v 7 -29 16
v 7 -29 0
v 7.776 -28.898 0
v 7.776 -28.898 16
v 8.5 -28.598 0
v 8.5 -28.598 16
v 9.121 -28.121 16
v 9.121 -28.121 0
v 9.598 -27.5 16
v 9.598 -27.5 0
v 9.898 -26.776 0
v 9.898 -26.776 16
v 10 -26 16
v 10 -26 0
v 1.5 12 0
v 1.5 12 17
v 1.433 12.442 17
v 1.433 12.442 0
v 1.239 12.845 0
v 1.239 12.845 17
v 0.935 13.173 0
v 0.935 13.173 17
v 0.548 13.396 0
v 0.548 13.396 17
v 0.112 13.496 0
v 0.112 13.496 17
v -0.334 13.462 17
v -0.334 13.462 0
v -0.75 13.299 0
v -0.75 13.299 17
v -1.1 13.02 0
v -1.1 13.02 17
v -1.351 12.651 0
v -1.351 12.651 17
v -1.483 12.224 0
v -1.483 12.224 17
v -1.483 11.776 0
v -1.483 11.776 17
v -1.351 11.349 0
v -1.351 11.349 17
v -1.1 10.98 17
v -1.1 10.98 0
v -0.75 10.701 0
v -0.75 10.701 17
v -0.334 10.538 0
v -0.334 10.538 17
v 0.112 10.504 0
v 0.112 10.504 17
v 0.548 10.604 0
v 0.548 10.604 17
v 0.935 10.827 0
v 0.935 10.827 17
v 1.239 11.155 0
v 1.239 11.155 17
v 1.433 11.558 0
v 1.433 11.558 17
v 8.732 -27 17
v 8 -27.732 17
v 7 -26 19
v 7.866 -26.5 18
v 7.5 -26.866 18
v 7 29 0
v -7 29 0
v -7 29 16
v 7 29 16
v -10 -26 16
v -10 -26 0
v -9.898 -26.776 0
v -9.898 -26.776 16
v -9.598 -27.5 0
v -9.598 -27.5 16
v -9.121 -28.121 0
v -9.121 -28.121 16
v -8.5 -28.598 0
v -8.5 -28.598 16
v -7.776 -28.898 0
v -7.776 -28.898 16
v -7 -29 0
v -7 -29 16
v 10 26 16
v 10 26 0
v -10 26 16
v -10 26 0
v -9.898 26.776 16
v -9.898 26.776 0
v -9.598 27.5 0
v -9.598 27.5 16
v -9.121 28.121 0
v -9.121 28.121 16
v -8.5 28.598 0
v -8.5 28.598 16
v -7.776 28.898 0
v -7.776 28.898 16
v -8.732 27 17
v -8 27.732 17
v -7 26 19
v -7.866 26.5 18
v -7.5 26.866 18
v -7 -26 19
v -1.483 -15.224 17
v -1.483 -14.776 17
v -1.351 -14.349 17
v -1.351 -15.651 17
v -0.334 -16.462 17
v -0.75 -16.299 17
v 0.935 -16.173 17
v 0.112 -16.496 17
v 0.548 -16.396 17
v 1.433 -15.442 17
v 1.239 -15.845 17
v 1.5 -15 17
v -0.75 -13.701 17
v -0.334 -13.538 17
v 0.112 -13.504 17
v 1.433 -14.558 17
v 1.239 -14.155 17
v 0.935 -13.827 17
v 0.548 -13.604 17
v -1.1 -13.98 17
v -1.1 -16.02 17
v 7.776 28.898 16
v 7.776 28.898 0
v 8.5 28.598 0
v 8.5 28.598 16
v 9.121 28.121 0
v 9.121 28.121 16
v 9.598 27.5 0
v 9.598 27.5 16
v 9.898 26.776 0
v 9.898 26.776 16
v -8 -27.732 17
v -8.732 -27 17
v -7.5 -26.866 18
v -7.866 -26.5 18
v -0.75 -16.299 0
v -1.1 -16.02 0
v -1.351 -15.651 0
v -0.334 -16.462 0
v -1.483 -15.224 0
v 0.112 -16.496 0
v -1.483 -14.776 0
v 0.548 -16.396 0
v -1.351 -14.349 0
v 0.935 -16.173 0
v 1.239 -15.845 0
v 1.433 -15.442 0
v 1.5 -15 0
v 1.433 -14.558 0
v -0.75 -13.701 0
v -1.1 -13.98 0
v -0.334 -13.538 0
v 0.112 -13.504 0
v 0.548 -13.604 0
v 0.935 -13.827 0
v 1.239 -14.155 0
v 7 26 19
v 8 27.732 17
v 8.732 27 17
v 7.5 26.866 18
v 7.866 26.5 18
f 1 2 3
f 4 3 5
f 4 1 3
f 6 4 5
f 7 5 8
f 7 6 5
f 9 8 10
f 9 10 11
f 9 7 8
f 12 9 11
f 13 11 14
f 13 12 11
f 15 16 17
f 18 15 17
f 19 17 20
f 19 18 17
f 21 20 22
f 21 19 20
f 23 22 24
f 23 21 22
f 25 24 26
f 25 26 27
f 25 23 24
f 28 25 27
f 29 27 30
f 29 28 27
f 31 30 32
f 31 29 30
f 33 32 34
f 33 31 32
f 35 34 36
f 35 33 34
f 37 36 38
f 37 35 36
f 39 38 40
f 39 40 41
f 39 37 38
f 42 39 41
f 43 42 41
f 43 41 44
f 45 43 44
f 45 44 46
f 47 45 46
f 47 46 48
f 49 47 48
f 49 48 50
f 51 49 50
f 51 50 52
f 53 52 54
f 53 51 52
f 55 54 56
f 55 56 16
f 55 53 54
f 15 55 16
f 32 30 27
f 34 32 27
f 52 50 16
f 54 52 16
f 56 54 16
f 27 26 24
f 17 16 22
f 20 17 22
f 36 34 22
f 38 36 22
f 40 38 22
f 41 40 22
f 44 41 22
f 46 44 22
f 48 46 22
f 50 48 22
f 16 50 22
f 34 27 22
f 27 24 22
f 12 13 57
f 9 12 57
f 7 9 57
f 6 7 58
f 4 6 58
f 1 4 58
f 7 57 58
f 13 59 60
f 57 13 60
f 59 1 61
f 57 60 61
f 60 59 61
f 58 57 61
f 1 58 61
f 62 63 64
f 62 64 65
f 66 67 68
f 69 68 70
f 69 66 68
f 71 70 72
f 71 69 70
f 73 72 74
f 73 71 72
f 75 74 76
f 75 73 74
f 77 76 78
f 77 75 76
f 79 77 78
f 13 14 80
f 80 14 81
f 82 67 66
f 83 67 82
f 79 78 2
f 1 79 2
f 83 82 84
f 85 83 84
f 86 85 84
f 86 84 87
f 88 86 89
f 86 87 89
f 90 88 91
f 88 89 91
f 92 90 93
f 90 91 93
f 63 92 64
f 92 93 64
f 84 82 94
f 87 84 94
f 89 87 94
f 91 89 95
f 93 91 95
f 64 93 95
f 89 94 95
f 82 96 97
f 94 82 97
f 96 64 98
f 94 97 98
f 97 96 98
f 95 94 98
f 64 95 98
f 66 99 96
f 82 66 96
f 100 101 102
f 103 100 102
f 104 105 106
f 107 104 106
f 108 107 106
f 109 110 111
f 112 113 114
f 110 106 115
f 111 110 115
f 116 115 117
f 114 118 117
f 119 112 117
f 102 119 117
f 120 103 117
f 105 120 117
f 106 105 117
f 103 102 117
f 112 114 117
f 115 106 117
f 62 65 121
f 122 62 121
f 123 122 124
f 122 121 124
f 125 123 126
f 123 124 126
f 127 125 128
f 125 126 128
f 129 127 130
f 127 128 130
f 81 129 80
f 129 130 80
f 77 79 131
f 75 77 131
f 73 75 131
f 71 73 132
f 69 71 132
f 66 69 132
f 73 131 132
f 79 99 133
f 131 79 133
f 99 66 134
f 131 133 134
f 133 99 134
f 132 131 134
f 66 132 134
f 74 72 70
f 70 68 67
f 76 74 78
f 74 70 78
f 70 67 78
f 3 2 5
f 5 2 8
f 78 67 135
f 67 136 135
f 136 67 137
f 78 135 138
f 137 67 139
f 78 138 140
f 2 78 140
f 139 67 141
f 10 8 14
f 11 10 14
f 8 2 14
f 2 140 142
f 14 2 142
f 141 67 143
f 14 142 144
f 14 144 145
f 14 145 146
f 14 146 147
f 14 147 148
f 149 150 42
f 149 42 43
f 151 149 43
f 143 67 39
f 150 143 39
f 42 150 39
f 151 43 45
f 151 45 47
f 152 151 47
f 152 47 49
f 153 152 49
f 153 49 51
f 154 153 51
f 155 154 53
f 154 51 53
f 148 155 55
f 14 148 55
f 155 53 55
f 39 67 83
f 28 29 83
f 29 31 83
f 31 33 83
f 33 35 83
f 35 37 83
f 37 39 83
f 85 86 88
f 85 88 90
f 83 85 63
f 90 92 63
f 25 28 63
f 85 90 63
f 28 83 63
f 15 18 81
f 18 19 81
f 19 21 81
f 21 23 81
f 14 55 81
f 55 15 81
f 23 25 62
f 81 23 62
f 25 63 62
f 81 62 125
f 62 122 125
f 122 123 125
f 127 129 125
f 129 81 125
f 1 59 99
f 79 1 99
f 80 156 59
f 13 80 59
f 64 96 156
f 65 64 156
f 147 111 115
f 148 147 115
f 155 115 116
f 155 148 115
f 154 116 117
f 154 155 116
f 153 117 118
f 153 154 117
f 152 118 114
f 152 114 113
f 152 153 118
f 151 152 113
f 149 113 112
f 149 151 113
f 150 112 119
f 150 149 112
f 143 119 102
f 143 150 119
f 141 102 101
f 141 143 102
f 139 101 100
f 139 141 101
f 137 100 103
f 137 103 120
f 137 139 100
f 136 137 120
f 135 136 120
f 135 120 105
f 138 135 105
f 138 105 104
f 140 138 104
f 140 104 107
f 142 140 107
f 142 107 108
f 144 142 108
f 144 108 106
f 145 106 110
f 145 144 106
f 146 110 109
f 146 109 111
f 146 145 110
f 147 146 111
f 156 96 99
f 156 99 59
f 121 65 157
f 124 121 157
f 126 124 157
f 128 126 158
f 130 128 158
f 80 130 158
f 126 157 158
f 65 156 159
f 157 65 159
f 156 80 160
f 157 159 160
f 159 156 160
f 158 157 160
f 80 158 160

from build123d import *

# Parameters (mm, degrees)
F0_W     = 20
F0_H     = 58
F1_DEPTH = 19
F2_R     = 1.5
F3_DEPTH = 17.000001
F4_R     = 3
F5_SIZE  = 3


with BuildPart() as f1:
    # F0 (on Top) → F1 (new body)
    with BuildSketch(Plane.XY):
        Rectangle(F0_W, F0_H)
    extrude(amount=F1_DEPTH)

    # F2 (on Top) → F3 (cut)
    with BuildSketch(Plane.XY):
        with Locations((0, 12)):
            Circle(F2_R)
        with Locations((0, -15)):
            Circle(F2_R)
    extrude(amount=F3_DEPTH, mode=Mode.SUBTRACT)

    # F4
    f4_edges = [f1.edges().sort_by_distance(p)[0] for p in [
        (-10, 29, 9.5),
        (10, 29, 9.5),
        (-10, -29, 9.5),
        (10, -29, 9.5),
    ]]
    fillet(f4_edges, radius=F4_R)

    # F5
    f5_edges = [f1.edges().sort_by_distance(p)[0] for p in [
        (-10, 0, 19),
    ]]
    chamfer(f5_edges, length=F5_SIZE)


solid = f1.part
